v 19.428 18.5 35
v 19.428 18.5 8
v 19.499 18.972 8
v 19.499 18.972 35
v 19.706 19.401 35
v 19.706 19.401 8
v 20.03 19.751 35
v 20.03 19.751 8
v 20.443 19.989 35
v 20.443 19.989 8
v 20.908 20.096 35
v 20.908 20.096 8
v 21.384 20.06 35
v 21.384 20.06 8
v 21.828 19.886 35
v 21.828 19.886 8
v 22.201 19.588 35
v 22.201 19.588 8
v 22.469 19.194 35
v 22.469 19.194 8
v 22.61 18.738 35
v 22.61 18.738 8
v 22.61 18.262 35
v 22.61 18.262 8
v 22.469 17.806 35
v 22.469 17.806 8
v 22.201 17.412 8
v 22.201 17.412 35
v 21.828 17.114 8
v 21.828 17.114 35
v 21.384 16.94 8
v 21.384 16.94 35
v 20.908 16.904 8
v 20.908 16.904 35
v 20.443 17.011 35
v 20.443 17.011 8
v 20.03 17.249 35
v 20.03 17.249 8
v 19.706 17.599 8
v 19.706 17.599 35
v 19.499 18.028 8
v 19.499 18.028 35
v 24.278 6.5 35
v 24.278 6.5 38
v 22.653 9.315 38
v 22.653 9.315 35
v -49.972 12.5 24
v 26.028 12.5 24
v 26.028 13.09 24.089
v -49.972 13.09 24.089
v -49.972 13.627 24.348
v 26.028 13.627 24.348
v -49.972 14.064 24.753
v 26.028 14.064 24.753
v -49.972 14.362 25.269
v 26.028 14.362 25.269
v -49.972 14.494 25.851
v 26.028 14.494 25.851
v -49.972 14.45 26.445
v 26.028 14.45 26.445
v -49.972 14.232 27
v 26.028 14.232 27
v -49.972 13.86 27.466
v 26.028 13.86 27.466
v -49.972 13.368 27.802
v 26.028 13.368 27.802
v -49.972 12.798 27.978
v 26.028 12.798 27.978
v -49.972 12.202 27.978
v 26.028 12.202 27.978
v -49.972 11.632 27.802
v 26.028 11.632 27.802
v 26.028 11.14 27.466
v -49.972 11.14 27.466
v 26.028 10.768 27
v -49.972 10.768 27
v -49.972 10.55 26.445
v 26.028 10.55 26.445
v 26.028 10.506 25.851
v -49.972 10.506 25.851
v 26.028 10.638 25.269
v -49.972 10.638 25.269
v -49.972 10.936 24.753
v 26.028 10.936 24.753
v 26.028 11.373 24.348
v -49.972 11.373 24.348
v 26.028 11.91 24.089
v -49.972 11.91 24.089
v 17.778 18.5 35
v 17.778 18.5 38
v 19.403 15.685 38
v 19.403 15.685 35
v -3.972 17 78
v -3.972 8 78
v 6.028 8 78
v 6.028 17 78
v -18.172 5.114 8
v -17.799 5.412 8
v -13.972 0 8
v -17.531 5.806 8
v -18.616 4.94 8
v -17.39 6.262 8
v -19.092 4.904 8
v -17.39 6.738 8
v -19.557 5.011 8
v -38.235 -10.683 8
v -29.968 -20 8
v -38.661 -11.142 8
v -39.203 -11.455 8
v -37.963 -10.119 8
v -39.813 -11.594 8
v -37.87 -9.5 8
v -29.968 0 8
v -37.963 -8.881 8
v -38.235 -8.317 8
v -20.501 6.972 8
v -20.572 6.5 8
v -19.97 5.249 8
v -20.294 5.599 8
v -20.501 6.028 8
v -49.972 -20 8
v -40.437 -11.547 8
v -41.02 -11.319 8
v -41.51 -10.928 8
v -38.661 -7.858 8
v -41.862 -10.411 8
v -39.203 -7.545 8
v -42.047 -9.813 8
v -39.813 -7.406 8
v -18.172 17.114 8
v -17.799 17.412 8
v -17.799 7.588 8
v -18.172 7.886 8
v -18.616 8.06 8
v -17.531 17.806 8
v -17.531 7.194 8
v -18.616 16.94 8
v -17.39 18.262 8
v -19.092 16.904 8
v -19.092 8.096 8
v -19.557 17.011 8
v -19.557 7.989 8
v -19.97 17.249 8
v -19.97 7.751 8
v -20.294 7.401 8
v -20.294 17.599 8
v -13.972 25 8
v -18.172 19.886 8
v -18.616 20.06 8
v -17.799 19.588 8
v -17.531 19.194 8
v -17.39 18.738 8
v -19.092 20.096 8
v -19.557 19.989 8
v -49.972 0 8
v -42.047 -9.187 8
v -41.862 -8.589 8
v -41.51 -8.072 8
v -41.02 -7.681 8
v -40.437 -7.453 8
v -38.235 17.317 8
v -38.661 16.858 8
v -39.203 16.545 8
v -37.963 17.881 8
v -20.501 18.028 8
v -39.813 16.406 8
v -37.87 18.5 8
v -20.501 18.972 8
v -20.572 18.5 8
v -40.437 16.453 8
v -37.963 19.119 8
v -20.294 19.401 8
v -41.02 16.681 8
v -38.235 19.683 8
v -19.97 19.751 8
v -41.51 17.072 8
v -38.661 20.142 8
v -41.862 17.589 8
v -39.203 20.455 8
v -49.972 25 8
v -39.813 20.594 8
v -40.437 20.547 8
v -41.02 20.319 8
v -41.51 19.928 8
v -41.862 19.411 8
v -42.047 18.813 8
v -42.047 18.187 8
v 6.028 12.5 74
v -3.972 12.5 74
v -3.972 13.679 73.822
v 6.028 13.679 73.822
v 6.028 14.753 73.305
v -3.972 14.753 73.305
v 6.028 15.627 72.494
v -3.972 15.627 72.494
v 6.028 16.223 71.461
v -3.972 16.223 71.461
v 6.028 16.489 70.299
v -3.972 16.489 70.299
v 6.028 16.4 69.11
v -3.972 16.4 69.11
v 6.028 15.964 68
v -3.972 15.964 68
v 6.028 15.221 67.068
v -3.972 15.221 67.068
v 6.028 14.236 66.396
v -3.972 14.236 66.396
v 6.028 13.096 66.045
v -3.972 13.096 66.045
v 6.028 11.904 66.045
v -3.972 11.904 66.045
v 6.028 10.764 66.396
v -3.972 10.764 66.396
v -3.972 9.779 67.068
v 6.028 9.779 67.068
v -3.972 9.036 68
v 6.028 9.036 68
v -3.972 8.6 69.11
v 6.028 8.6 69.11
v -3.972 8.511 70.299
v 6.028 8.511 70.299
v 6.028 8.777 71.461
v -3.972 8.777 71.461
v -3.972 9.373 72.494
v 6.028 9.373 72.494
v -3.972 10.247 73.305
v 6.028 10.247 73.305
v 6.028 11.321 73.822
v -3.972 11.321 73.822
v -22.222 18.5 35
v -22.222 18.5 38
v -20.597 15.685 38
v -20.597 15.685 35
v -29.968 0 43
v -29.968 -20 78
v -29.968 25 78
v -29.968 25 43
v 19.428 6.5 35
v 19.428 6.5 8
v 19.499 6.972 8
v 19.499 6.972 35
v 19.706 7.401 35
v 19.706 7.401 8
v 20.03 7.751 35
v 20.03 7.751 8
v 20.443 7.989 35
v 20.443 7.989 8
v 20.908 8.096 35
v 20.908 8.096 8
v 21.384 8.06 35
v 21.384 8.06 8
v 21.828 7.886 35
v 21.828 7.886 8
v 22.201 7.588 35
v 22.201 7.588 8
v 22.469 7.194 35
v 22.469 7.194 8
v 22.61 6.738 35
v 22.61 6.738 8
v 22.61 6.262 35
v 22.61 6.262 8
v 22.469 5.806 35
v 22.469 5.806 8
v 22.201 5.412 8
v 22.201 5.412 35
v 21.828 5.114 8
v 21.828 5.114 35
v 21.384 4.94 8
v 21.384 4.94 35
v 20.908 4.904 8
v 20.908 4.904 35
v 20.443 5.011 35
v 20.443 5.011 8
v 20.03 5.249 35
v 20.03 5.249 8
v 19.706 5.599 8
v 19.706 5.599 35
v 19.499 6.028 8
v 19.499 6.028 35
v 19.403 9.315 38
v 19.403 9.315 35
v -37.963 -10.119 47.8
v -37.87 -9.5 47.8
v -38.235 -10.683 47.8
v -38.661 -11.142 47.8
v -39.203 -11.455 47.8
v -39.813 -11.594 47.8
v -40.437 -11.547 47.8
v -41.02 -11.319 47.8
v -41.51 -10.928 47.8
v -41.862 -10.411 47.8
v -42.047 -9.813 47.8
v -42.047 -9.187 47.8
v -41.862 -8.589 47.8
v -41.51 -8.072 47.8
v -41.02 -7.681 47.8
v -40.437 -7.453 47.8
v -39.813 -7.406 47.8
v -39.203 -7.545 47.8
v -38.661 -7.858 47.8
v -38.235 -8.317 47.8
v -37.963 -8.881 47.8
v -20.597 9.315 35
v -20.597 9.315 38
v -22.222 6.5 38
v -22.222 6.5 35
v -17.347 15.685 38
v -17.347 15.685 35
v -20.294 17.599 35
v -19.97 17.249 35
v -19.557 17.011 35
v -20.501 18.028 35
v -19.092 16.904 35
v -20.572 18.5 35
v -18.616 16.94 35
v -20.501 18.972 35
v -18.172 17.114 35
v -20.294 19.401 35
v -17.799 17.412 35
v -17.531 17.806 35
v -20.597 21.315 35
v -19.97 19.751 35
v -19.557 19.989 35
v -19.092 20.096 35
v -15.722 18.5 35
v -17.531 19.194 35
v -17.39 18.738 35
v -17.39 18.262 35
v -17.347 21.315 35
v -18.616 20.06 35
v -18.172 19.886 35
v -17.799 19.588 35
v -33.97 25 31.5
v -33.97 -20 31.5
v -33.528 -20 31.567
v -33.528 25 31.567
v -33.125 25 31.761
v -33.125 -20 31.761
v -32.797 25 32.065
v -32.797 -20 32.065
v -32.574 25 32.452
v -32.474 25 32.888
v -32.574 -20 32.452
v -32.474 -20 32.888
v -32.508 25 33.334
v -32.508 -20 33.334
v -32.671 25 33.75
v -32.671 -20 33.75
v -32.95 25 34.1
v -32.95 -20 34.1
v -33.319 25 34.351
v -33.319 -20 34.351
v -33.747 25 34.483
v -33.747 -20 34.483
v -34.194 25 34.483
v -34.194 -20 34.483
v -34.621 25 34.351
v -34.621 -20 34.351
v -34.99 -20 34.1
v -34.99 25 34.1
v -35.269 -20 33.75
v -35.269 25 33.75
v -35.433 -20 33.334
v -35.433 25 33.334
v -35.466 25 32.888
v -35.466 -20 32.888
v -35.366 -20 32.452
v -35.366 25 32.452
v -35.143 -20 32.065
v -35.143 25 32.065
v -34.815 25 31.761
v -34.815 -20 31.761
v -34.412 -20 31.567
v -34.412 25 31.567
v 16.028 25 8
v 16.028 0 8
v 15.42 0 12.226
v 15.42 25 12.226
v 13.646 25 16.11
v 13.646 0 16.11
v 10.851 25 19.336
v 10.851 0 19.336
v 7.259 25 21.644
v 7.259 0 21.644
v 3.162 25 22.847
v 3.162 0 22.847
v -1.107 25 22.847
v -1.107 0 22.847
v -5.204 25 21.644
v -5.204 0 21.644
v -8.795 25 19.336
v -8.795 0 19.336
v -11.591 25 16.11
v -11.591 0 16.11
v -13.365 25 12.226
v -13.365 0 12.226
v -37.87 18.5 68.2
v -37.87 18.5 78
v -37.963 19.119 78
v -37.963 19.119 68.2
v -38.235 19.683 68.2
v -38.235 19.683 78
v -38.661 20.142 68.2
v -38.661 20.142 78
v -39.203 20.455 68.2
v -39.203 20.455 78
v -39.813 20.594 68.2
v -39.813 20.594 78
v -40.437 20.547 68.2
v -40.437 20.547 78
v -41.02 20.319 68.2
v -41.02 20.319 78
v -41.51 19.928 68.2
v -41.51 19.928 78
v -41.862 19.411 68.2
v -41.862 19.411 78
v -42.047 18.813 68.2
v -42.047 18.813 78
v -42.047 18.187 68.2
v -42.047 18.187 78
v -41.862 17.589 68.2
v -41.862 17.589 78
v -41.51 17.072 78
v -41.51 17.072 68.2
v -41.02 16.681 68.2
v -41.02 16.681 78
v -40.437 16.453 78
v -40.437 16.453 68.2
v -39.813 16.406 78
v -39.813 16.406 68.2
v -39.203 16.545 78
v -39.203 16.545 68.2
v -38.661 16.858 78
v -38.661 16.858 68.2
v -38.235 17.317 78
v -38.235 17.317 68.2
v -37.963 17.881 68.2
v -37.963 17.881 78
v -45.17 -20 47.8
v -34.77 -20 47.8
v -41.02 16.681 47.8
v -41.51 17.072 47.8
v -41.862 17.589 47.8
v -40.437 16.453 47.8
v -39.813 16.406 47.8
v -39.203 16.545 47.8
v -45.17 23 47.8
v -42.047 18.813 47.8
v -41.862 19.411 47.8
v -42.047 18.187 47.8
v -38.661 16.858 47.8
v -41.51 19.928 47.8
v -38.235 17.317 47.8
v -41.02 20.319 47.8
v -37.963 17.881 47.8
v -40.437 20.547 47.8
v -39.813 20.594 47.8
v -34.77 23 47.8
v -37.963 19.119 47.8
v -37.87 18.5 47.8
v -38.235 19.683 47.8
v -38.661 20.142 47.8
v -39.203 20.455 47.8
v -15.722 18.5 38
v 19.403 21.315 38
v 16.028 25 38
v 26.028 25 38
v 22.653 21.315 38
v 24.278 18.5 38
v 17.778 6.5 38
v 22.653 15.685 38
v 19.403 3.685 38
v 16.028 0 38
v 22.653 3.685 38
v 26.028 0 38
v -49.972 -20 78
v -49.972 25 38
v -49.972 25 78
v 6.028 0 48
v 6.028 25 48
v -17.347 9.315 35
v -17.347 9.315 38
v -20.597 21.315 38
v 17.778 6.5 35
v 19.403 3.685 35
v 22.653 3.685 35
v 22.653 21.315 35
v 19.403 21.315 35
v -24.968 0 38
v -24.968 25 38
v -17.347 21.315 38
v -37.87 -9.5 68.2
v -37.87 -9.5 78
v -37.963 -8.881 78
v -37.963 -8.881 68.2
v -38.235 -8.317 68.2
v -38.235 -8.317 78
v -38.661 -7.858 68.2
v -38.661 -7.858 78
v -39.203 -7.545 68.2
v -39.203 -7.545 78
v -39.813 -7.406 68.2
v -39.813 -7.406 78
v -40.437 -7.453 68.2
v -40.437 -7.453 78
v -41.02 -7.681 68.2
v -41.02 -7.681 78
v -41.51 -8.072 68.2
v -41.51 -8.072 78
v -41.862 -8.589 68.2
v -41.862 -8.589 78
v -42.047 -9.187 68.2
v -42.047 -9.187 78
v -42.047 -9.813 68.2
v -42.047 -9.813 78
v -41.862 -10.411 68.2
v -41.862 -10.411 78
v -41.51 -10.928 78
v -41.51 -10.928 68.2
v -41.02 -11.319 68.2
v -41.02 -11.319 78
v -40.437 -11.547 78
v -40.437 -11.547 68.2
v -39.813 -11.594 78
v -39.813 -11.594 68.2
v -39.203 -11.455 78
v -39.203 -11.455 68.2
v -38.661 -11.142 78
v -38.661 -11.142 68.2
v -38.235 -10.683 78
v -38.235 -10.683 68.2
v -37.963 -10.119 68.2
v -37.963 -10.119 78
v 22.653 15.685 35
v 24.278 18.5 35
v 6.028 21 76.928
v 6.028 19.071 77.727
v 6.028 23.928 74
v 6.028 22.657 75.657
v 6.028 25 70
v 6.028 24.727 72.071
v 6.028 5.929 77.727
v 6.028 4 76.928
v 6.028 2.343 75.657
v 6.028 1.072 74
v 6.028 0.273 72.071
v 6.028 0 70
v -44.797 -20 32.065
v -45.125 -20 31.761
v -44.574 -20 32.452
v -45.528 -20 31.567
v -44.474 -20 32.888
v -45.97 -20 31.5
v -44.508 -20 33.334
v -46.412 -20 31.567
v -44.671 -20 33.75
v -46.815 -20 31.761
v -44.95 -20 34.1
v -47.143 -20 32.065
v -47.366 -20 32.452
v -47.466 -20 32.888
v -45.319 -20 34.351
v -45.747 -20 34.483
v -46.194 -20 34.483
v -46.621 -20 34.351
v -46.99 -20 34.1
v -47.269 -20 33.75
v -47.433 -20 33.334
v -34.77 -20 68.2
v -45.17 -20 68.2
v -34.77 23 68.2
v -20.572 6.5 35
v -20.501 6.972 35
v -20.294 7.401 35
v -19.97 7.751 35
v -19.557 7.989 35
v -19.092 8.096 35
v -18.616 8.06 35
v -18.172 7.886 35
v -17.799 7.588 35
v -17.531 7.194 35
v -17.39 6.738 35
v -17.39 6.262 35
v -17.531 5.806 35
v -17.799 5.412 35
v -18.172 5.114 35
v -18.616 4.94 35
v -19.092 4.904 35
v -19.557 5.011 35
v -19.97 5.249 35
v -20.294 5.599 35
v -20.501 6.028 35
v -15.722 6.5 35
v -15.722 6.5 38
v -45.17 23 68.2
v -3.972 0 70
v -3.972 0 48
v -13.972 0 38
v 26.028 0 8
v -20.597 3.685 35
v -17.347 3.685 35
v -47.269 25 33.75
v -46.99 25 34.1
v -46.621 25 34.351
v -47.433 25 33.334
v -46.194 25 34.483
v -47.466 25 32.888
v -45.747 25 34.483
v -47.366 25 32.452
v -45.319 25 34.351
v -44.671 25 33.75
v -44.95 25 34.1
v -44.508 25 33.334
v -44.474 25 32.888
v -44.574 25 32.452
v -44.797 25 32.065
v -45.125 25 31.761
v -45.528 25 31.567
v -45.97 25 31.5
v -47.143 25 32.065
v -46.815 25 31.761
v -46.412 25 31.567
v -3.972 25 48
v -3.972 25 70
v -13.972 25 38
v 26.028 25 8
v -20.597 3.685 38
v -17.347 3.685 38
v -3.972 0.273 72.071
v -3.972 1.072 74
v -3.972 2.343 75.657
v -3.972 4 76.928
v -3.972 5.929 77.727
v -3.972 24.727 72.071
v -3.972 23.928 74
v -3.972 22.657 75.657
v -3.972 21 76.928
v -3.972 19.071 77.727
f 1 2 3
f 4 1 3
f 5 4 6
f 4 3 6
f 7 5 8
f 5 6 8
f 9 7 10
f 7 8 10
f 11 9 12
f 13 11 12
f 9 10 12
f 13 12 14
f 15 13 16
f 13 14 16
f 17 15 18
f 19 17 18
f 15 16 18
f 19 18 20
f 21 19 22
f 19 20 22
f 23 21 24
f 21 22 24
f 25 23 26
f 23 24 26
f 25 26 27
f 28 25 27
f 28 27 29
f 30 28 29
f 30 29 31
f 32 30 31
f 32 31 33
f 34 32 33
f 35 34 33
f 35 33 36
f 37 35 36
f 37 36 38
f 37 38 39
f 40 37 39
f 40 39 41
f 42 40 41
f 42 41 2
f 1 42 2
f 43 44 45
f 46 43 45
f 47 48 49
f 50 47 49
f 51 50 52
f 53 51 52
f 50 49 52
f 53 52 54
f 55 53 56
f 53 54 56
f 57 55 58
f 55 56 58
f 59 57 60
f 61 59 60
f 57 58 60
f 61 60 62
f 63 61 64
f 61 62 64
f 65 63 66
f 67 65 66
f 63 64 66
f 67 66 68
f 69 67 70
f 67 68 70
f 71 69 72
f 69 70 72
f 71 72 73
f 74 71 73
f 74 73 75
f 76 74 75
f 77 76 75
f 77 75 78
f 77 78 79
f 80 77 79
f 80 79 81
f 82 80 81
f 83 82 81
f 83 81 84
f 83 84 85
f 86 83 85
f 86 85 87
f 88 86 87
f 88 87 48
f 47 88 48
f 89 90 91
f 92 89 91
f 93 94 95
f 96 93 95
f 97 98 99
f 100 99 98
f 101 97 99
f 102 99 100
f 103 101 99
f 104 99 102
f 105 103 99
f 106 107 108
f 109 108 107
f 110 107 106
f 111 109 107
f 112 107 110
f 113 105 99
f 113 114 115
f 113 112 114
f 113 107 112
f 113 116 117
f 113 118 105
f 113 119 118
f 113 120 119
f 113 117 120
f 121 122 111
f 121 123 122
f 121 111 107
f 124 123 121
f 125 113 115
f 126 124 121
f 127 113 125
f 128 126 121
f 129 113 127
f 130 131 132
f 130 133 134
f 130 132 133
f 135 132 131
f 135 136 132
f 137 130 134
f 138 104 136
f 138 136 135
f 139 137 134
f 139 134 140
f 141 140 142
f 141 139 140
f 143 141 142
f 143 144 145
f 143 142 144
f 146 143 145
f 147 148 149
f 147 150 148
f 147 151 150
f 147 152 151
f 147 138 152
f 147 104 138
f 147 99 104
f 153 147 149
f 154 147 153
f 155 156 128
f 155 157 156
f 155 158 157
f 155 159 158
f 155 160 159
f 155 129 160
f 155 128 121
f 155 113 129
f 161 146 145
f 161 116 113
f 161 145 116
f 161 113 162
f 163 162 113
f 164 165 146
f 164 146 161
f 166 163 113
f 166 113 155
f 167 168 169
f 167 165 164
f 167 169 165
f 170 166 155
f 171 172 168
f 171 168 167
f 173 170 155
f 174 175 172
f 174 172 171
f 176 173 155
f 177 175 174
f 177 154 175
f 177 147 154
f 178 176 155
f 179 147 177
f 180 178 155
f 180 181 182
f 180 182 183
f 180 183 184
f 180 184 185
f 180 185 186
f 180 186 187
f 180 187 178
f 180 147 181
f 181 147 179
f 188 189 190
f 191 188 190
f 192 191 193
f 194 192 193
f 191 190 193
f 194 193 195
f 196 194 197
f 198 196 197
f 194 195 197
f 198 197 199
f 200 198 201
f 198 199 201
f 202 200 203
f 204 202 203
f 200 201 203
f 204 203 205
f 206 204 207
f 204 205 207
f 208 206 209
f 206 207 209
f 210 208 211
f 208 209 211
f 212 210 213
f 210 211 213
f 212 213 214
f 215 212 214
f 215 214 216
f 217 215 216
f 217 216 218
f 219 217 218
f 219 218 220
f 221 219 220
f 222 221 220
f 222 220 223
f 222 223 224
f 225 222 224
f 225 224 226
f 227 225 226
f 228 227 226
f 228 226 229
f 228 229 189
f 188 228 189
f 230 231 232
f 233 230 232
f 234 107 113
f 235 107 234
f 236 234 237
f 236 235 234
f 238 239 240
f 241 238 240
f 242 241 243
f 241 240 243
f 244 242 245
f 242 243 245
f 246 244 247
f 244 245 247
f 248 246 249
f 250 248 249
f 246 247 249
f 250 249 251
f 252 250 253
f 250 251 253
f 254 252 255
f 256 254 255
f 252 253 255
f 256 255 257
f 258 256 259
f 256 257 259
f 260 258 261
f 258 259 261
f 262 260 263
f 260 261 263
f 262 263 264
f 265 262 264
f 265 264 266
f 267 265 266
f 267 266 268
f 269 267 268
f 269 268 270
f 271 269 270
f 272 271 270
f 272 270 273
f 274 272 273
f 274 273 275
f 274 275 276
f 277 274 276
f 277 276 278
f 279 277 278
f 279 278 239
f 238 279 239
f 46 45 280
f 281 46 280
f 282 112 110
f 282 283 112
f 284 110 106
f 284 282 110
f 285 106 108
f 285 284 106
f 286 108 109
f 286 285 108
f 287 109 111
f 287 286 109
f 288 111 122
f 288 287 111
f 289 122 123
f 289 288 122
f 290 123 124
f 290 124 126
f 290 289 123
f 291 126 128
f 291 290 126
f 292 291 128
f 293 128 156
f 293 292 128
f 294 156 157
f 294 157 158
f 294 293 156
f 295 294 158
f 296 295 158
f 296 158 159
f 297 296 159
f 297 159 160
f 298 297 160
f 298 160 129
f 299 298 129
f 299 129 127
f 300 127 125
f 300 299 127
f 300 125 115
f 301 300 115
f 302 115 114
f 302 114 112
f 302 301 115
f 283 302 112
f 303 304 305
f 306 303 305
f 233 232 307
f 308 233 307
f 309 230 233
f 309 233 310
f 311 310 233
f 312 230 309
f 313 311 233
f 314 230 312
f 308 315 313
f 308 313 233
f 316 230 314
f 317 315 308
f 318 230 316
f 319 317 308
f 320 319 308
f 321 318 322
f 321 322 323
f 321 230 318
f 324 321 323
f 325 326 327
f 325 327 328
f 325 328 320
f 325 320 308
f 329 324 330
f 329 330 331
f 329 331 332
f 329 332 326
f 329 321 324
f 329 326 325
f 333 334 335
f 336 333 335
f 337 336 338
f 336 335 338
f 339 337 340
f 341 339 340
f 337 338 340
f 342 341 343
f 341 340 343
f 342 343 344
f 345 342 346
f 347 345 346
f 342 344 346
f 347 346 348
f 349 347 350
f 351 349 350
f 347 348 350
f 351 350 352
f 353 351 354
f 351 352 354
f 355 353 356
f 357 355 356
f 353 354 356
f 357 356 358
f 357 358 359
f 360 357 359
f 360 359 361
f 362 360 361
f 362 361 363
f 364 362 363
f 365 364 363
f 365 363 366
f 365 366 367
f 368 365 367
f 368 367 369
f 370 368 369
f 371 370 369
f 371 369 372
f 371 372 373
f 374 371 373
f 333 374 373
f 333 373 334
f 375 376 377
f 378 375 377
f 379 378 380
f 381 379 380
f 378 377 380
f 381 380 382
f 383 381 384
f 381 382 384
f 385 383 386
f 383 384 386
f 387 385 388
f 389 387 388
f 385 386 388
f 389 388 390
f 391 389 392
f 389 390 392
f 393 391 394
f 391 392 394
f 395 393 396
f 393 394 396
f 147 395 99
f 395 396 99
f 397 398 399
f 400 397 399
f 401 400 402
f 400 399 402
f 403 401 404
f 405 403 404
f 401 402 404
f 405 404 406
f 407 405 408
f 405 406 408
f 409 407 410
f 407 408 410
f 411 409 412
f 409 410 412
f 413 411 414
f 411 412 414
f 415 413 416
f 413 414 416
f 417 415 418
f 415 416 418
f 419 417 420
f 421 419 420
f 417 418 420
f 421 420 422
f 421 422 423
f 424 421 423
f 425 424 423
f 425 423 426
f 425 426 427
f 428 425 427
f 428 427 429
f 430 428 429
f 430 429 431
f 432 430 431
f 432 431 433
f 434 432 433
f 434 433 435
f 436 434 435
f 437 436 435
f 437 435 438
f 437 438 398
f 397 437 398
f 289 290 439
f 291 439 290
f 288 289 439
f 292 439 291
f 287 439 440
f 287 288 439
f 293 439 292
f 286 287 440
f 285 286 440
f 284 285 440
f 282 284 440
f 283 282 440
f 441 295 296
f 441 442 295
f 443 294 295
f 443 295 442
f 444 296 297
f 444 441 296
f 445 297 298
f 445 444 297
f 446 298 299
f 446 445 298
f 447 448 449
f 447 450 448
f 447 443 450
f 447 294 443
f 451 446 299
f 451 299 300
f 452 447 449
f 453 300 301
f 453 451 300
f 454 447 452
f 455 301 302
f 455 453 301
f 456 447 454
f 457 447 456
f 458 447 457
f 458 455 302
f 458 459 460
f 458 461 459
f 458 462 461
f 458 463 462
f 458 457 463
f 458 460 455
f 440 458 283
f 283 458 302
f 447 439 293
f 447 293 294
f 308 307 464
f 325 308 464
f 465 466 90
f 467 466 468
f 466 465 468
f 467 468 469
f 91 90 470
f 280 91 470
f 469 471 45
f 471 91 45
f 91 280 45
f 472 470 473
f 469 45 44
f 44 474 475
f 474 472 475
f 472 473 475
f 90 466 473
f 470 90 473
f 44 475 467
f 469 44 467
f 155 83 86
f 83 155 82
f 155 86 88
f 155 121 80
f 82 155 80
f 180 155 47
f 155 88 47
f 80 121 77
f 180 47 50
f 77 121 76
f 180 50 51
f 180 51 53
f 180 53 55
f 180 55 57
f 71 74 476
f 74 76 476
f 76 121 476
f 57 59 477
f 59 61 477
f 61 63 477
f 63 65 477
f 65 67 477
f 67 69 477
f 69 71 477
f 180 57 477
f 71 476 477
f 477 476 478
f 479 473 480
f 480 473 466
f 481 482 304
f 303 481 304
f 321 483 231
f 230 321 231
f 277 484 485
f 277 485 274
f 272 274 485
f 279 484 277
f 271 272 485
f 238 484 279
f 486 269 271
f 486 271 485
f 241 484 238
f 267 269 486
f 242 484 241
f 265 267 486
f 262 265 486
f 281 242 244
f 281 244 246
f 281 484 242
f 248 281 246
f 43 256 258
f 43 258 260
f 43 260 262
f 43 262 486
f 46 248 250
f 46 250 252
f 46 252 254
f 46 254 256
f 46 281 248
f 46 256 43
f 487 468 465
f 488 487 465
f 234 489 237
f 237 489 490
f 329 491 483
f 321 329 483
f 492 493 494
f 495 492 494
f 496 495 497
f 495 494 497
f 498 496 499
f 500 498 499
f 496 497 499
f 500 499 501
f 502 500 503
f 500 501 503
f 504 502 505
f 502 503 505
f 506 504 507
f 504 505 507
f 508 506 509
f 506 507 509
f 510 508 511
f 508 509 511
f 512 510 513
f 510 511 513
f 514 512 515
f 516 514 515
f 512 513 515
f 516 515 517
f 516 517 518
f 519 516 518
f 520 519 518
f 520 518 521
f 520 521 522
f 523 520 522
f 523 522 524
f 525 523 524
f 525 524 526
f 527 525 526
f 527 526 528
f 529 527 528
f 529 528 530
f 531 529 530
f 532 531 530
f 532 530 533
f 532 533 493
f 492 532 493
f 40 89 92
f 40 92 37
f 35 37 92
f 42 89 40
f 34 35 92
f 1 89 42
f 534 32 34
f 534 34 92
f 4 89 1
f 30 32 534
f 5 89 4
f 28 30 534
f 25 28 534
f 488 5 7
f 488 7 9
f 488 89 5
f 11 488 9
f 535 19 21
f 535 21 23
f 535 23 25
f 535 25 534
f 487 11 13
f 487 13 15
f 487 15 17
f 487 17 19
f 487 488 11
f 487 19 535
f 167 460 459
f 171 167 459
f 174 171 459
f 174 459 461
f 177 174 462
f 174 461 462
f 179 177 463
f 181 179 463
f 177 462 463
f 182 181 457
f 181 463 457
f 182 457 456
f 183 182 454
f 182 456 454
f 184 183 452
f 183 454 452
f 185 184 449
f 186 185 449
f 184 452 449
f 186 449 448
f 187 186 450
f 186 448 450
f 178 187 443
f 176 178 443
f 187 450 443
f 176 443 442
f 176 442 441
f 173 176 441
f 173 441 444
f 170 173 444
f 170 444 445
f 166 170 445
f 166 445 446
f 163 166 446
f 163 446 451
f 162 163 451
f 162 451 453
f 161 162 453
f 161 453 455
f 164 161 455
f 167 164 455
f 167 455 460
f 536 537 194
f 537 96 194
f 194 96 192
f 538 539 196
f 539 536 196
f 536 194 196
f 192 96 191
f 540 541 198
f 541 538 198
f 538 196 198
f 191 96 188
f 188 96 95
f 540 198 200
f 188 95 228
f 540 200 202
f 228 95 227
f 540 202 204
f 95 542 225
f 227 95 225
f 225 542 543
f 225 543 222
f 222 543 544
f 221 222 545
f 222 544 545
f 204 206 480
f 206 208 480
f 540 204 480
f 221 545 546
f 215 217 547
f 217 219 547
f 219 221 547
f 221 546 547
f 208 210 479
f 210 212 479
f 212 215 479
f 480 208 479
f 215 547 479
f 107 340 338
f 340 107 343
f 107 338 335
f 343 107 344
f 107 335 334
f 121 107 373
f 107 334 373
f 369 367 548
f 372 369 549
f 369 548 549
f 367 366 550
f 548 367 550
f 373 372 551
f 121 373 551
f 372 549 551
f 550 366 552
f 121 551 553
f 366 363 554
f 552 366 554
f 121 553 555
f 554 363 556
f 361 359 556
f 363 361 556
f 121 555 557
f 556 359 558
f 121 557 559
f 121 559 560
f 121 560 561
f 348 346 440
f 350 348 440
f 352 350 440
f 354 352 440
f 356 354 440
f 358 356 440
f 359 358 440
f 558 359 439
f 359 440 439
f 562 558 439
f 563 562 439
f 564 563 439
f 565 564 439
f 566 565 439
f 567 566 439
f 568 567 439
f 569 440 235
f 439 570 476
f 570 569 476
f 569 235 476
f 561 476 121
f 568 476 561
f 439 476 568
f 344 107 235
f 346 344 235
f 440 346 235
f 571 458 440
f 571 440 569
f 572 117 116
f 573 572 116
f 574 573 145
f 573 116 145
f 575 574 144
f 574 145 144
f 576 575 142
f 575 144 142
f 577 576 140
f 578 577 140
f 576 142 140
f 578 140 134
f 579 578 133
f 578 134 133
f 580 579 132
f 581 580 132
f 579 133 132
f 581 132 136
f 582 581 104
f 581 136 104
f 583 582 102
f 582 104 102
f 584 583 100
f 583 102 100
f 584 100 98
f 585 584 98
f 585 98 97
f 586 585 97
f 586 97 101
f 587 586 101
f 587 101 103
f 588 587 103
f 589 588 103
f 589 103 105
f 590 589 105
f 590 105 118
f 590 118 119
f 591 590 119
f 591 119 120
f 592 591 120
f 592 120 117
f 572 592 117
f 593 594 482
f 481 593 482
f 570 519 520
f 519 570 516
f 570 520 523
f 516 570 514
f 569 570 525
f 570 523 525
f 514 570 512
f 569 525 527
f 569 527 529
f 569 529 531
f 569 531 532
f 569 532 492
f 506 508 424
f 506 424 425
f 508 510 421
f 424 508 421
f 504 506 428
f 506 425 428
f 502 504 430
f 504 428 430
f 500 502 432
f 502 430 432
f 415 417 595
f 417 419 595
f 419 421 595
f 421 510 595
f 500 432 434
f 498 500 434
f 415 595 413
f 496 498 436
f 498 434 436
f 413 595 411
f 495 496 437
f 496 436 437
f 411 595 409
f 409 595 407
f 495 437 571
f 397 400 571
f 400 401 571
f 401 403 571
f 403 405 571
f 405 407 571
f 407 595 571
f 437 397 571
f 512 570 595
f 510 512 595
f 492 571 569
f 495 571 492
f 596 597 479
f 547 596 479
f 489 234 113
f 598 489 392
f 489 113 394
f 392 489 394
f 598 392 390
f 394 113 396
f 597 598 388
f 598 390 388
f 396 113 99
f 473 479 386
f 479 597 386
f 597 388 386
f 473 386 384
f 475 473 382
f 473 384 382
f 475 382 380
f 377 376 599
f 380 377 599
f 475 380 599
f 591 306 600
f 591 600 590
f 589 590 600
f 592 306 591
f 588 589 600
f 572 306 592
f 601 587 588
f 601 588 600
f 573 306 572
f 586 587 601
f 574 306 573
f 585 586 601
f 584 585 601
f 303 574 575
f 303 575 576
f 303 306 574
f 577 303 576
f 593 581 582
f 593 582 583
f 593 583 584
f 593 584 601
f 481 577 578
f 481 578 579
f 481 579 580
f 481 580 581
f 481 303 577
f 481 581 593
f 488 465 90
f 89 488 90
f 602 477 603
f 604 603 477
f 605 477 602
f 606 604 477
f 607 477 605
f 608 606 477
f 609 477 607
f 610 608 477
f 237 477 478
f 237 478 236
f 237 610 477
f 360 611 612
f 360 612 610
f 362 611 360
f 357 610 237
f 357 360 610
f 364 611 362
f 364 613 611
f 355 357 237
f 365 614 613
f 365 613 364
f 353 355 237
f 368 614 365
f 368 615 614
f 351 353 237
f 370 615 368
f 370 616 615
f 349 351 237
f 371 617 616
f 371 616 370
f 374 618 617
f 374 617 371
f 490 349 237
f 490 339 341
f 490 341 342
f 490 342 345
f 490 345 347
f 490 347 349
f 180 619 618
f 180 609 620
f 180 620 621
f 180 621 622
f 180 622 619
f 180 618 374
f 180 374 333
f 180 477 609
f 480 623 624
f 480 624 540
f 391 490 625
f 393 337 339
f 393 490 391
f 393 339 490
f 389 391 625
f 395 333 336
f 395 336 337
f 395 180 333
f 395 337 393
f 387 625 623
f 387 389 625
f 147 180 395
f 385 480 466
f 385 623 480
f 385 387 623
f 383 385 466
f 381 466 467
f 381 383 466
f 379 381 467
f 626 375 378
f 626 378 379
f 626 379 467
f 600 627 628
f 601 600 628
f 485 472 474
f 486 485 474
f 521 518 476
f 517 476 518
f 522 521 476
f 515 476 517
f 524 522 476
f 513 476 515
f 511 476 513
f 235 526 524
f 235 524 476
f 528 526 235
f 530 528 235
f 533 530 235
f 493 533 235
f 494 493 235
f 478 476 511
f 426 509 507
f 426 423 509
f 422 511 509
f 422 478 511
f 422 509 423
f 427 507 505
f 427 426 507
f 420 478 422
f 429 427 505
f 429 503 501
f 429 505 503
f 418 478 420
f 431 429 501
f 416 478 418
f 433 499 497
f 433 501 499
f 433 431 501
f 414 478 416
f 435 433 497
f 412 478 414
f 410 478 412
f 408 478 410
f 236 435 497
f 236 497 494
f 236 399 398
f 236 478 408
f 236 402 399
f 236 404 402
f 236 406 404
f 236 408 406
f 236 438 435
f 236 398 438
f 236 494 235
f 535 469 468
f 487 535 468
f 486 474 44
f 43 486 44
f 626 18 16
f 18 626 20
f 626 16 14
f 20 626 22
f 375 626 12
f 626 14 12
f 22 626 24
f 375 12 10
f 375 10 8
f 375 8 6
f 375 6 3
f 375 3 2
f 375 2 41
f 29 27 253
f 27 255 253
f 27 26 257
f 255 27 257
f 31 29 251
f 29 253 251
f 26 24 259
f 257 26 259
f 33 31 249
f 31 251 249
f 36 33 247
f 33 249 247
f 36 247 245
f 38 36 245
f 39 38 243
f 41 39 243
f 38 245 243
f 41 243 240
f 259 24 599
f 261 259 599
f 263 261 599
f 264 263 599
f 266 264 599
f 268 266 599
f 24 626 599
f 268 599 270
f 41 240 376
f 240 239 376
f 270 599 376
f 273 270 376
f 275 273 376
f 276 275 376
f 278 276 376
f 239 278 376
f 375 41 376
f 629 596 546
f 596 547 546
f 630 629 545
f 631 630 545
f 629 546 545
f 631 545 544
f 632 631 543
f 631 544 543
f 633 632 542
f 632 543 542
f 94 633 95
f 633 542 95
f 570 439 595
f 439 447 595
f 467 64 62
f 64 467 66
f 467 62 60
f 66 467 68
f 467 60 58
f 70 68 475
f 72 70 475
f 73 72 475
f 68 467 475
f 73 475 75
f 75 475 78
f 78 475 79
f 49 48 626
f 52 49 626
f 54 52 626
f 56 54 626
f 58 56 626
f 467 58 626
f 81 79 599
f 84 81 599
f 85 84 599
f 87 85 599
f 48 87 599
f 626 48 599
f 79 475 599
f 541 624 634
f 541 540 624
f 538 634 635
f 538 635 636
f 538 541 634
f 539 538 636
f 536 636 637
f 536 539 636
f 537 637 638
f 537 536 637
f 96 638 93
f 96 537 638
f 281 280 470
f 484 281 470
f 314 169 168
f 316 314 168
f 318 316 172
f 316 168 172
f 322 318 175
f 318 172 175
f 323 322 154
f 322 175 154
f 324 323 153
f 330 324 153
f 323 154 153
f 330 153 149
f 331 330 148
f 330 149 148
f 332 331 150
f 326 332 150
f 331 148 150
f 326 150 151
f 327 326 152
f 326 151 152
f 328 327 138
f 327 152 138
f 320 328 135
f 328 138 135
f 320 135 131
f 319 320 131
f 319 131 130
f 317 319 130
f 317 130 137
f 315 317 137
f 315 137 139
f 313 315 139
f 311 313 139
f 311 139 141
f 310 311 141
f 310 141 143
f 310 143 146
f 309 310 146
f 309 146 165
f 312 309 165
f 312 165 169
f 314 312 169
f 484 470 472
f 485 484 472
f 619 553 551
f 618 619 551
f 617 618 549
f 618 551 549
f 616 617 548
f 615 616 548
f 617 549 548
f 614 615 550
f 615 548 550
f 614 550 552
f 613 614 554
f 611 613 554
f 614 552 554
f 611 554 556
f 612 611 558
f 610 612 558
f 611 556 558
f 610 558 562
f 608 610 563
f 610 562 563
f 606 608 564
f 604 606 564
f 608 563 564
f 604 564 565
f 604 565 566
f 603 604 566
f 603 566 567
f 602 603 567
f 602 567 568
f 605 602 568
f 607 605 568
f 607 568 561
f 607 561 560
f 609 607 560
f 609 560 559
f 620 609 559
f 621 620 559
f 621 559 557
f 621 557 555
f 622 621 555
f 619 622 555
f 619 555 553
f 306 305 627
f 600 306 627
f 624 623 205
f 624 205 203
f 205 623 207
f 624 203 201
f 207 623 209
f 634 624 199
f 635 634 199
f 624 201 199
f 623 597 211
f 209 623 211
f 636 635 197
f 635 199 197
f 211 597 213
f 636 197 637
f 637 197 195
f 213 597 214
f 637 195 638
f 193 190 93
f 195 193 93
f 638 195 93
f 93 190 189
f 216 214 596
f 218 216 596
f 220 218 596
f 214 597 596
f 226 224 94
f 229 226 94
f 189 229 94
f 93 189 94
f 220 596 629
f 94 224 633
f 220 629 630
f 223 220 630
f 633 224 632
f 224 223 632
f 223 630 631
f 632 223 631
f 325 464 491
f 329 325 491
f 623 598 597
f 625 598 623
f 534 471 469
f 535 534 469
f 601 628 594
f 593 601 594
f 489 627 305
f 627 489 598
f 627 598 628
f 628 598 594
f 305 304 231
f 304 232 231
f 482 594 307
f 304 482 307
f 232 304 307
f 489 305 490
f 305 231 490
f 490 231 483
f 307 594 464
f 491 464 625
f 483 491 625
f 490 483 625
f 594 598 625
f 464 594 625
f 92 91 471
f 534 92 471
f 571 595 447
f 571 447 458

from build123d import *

# Parameters (mm, degrees)
BOSS_EXTRUDE1_DEPTH = 25
SKETCH2_R           = 4
CUT_EXTRUDE1_DEPTH  = 88.229582138
SKETCH3_R           = 1.6
CUT_EXTRUDE2_DEPTH  = 79.755553628
CUT_EXTRUDE3_DEPTH  = 3
FILLET2_R           = 8
CHAMFER2_SIZE       = 10
SKETCH5_W           = 30
SKETCH5_H           = 25
BOSS_EXTRUDE2_DEPTH = 26
SKETCH6_W           = 20.004484435
SKETCH6_H           = 25
BOSS_EXTRUDE3_DEPTH = 40
SKETCH7_W           = 10.4
SKETCH7_H           = 20.4
CUT_EXTRUDE4_DEPTH  = 23
SKETCH9_W           = 20.004484435
SKETCH9_H           = 40
SKETCH9_W_2         = 10.4
SKETCH9_H_2         = 20.4
BOSS_EXTRUDE4_DEPTH = 20
SKETCH10_R          = 2.1
CUT_EXTRUDE6_DEPTH  = 90.566948883
CHAMFER5_SIZE       = 5
SKETCH11_R          = 2
CUT_EXTRUDE7_DEPTH  = 112.736296699
SKETCH12_W          = 20.004484435
SKETCH12_H          = 20
SKETCH12_R          = 2.1
BOSS_EXTRUDE5_DEPTH = 30
SKETCH13_R          = 1.5
CUT_EXTRUDE8_DEPTH  = 103.986592973


with BuildPart() as part:
    # Sketch1 → Boss-Extrude1 (new body)
    with BuildSketch(Plane(origin=(0, 0, 0), x_dir=(1, 0, 0), z_dir=(0, 1, 0))):
        with BuildLine():
            Line((-13.972375691, -8), (-23.972375691, -8))
            Line((-23.972375691, -8), (-23.972375691, -38))
            Line((-23.972375691, -38), (-3.972375691, -38))
            Line((-3.972375691, -38), (-3.972375691, -78))
            Line((-3.972375691, -78), (6.027624309, -78))
            Line((6.027624309, -78), (6.027624309, -38))
            Line((6.027624309, -38), (26.027624309, -38))
            Line((26.027624309, -38), (26.027624309, -8))
            Line((26.027624309, -8), (16.027624309, -8))
            ThreePointArc((16.027624309, -8), (1.027624309, -23), (-13.972375691, -8))
        make_face()
    extrude(amount=BOSS_EXTRUDE1_DEPTH)

    # Sketch2 → Cut-Extrude1 (cut, through all)
    with BuildSketch(Plane.ZY.offset(3.972375691)):
        with Locations((70, 12.5)):
            Circle(SKETCH2_R)
    extrude(amount=-CUT_EXTRUDE1_DEPTH, mode=Mode.SUBTRACT)

    # Sketch3 → Cut-Extrude2 (cut, through all)
    with BuildSketch(Plane(origin=(0, 0, 8), x_dir=(-1, 0, 0), z_dir=(0, 0, -1))):
        with Locations((-21.027624309, 6.5)):
            Circle(SKETCH3_R)
        with Locations((-21.027624309, 18.5)):
            Circle(SKETCH3_R)
        with Locations((18.972375691, 6.5)):
            Circle(SKETCH3_R)
        with Locations((18.972375691, 18.5)):
            Circle(SKETCH3_R)
    extrude(amount=-CUT_EXTRUDE2_DEPTH, mode=Mode.SUBTRACT)

    # Sketch4 → Cut-Extrude3 (cut)
    with BuildSketch(Plane.XY.offset(38)):
        Polygon((24.277624309, 18.5), (22.652624309, 21.314582562), (19.402624309, 21.314582562), (17.777624309, 18.5), (19.402624309, 15.685417438), (22.652624309, 15.685417438), align=None)
        Polygon((24.277624309, 6.5), (22.652624309, 9.314582562), (19.402624309, 9.314582562), (17.777624309, 6.5), (19.402624309, 3.685417438), (22.652624309, 3.685417438), align=None)
        Polygon((-15.722375691, 18.5), (-17.347375691, 21.314582562), (-20.597375691, 21.314582562), (-22.222375691, 18.5), (-20.597375691, 15.685417438), (-17.347375691, 15.685417438), align=None)
        Polygon((-15.722375691, 6.5), (-17.347375691, 9.314582562), (-20.597375691, 9.314582562), (-22.222375691, 6.5), (-20.597375691, 3.685417438), (-17.347375691, 3.685417438), align=None)
    extrude(amount=-CUT_EXTRUDE3_DEPTH, mode=Mode.SUBTRACT)

    # Fillet2
    fillet2_edges = [part.edges().sort_by_distance(p)[0] for p in [
        (1.027624309, 0, 78),
        (1.027624309, 25, 78),
    ]]
    fillet(fillet2_edges, radius=FILLET2_R)

    # Chamfer2
    chamfer2_edges = [part.edges().sort_by_distance(p)[0] for p in [
        (6.027624309, 12.5, 38),
        (-3.972375691, 12.5, 38),
    ]]
    chamfer(chamfer2_edges, length=CHAMFER2_SIZE)

    # Sketch5 → Boss-Extrude2 (add)
    with BuildSketch(Plane.ZY.offset(23.972375691)):
        with Locations((23, 12.5)):
            Rectangle(SKETCH5_W, SKETCH5_H)
    extrude(amount=BOSS_EXTRUDE2_DEPTH)

    # Sketch6 → Boss-Extrude3 (add)
    with BuildSketch(Plane.XY.offset(38)):
        with Locations((-39.970133473, 12.5)):
            Rectangle(SKETCH6_W, SKETCH6_H)
    extrude(amount=BOSS_EXTRUDE3_DEPTH)

    # Sketch7 → Cut-Extrude4 (cut)
    with BuildSketch(Plane.XZ):
        with Locations((-39.970133474, 58)):
            Rectangle(SKETCH7_W, SKETCH7_H)
    extrude(amount=-CUT_EXTRUDE4_DEPTH, mode=Mode.SUBTRACT)

    # Sketch9 → Boss-Extrude4 (add)
    with BuildSketch(Plane.XZ):
        with Locations((-39.970133473, 58)):
            Rectangle(SKETCH9_W, SKETCH9_H)
        with Locations((-39.970133474, 58)):
            Rectangle(SKETCH9_W_2, SKETCH9_H_2, mode=Mode.SUBTRACT)
    extrude(amount=BOSS_EXTRUDE4_DEPTH)

    # Sketch10 → Cut-Extrude6 (cut, through all)
    with BuildSketch(Plane.XY.offset(78)):
        with Locations((-39.970133474, -9.5)):
            Circle(SKETCH10_R)
        with Locations((-39.970133474, 18.5)):
            Circle(SKETCH10_R)
    extrude(amount=-CUT_EXTRUDE6_DEPTH, mode=Mode.SUBTRACT)

    # Chamfer5
    chamfer5_edges = [part.edges().sort_by_distance(p)[0] for p in [
        (-29.967891256, 12.5, 38),
    ]]
    chamfer(chamfer5_edges, length=CHAMFER5_SIZE)

    # Sketch11 → Cut-Extrude7 (cut, through all)
    with BuildSketch(Plane(origin=(26.027624309, 0, 0), x_dir=(0, 0, -1), z_dir=(1, 0, 0))):
        with Locations((-26, 12.5)):
            Circle(SKETCH11_R)
    extrude(amount=-CUT_EXTRUDE7_DEPTH, mode=Mode.SUBTRACT)

    # Sketch12 → Boss-Extrude5 (add)
    with BuildSketch(Plane(origin=(0, 0, 38), x_dir=(-1, 0, 0), z_dir=(0, 0, -1))):
        with Locations((39.970133473, -10)):
            Rectangle(SKETCH12_W, SKETCH12_H)
        with Locations(Location((39.970133474, -9.5, 0), (0, 0, 180))):
            Circle(SKETCH12_R, mode=Mode.SUBTRACT)
    extrude(amount=BOSS_EXTRUDE5_DEPTH)

    # Sketch13 → Cut-Extrude8 (cut, through all)
    with BuildSketch(Plane.XZ.offset(20)):
        with Locations(Location((-33.970133474, 33, 0), (0, 0, 270))):
            Circle(SKETCH13_R)
        with Locations(Location((-45.970133474, 33, 0), (0, 0, 270))):
            Circle(SKETCH13_R)
    extrude(amount=-CUT_EXTRUDE8_DEPTH, mode=Mode.SUBTRACT)


solid = part.part
